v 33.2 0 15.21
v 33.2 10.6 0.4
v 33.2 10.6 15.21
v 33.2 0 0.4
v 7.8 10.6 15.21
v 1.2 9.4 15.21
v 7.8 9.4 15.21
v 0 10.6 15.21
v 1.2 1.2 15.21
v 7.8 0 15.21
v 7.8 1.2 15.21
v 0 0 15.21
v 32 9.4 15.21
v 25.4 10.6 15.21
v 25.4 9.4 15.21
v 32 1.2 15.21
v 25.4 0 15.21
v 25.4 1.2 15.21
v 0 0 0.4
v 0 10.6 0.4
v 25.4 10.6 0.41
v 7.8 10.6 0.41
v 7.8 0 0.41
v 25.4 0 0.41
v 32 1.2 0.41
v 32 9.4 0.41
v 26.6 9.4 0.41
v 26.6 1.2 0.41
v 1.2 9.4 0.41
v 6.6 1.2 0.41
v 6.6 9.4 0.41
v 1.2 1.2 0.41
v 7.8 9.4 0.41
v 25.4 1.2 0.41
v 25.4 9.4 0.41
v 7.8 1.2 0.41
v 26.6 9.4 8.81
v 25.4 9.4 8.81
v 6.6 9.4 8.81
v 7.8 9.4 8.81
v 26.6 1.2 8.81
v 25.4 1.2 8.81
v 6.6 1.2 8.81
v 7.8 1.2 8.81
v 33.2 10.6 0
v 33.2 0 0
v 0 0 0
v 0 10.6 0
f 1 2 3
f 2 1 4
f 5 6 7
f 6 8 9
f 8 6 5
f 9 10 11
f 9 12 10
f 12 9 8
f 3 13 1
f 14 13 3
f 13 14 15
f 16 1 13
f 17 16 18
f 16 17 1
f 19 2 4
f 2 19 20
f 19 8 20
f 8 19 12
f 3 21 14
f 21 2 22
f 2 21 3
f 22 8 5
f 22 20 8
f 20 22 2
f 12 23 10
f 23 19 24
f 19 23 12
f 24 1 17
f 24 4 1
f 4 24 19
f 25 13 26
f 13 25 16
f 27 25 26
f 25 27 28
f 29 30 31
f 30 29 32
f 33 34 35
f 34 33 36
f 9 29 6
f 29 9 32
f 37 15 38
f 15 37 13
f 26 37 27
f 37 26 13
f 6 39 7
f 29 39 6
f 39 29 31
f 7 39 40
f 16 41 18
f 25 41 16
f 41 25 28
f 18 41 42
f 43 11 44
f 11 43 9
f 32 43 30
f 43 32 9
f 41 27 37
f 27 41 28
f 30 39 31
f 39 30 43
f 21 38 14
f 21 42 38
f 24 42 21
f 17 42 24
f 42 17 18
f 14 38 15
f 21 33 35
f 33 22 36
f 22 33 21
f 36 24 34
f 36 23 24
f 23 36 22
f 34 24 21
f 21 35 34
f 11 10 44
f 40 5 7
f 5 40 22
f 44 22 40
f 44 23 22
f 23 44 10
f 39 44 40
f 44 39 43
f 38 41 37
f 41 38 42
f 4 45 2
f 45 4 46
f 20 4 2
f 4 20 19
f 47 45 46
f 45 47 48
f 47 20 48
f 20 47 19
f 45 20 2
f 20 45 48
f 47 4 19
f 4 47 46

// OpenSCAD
// file: ../../Base/Boxes.scad
// Fischertechnik Box Foundation
// Pre-designed Boxes

use <Constants.scad>

include <PlacementOptions.scad>

box190Width = 190;
box190Depth = 130;
box130Width = 130;
box130Depth = 95;
boxUsageHeight = 33.9;
boxWallThickness = 2.4;
boxBaseThickness = 1.0;
boxWebWidth = 3.0;

// getBoxWallThickness()
// Gets the wall thickness of a Fischertechnik Box

function getBoxWallThickness() = boxWallThickness;

// Gets the usable height of a fischertechnik box
function getBoxUsageHeight() = boxUsageHeight;

// Gets the thickness of the Fischertechnik box base.
function getBoxBaseThickness() = boxBaseThickness;

// Gets the width of a box web
function getBoxWebWidth() = boxWebWidth;

// Gets the usable inner space of a Box 190 as an x/y-list
function getBox190Space() = [
    box190Width - 2*getBoxWallThickness(), 
    box190Depth - 2*getBoxWallThickness() ];

// Imports the Fischertechnik empty box 130x190 mm and places it at position 0,0
// 190x130 are the outer sizes, the inner space is slightly smaller. Use getBox190Space() to get the inner sizes.
// This module needs the STL file "Fischertechnik Box 130x190.stl" in the library path.
// The box is positioned that the usable inner space is at the 0,0,0 position. The

module Box190() {
    translate([-getBoxWallThickness(),-getBoxWallThickness(),-getBoxBaseThickness()])
        import("Fischertechnik Box 130x190.stl", convexity=3);
}

// Gets the usable inner space of a Box 130 as an x/y-list
function getBox130Space() = [
    box130Width - 2*getBoxWallThickness(), 
    box130Depth - 2*getBoxWallThickness() ];

// Imports the Fischertechnik empty box 95x130 mm and places it at position 0,0
// 190x130 are the outer sizes, the inner space is slightly smaller. Use getBox190Space() to get the inner sizes.
// This module needs the STL file "Fischertechnik Box 95x130.stl" in the library path.
// The box is positioned that the usable inner space is at the 0,0,0 position. The

module Box130() {
    translate([-getBoxWallThickness(),-getBoxWallThickness(),-getBoxBaseThickness()])
        import("Fischertechnik Box 95x130.stl", convexity=3);
}

// Creates a web at the specified box walls
// corner 0 = LowerLeft, 1 = UpperLeft, 2 = UpperRight, 3 = LowerRight
// side 0 = LeftOfCorner, 1 = RightOfCorner
// distance = Distance in mm from the corner
// box = inner width and depth of the box (default: Box 190)
// webWidth = length of the web (default is 3 mms)
// webThickness = thickness of the web (default is 1 mm)

module BoxWeb(corner, side, distance, box=getBox190Space(), webWidth=getBoxWebWidth(), webThickness=1.0) {
    sink = getBoxWallThickness()/2;

    width = (corner % 2 == 0) ? 
            (side == LeftOfCorner ? webWidth : webThickness) :
            (side == LeftOfCorner ? webThickness : webWidth);

    depth = (corner % 2 == 0) ? 
            (side == RightOfCorner ? webWidth : webThickness) :
            (side == RightOfCorner ? webThickness : webWidth);
    
    xDiff = corner == LowerLeft ? 
                (side == LeftOfCorner ? -sink : distance) :
            (corner == UpperLeft ?                
                (side == LeftOfCorner ? distance : -sink) :
            (corner == UpperRight ?
                (side == LeftOfCorner ? box.x-webWidth+sink : box.x-distance-webThickness) :
                (side == LeftOfCorner ? box.x-distance-webThickness: box.x-webWidth+sink)));

    yDiff = corner == LowerLeft ? 
                (side == RightOfCorner ? -sink : distance) :
            (corner == UpperLeft ?
                (side == RightOfCorner ? box.y-distance : box.y-webWidth+sink) :
            (corner == UpperRight ?
                (side == RightOfCorner ? box.y-webWidth+sink : box.y-distance) :
                (side == RightOfCorner ? distance : -sink)));
    
    translate([xDiff, yDiff, -getExcess()])
        cube([width, depth, boxUsageHeight + 2*getExcess()]);
}
// file: ../../Base/Rotation.scad
// Fischertechnik Box Foundation
// Geometry Helpers Rotation

include <PlacementOptions.scad>

// getRotatedSpace(space, rotation=NoRotation)
// Rotates the space dependent on the specified rotation

function getRotatedSpace(space, rotation=NoRotation) = [
    (rotation == Rotate90 || rotation == Rotate270) ? space.y : space.x,
    (rotation == Rotate90 || rotation == Rotate270) ? space.x : space.y
];

// Rotates the given space around the fixed left lower corner
// space = the space the children needs as width/depth list [width,depth]
// rotation = 0 Rotate0 degrees, 1 Rotate90 degrees, 2 Rotate180 degrees, 3 Rotate270 degrees (equivalent to -90)

module RotateFix(space, rotation=Rotate0) {
    dy = (rotation == Rotate0 || rotation == Rotate270) ? 0 :
        (rotation == Rotate90) ? space.x :
        space.y;
    dx = (rotation < Rotate180) ? 0 :
        (rotation == Rotate180) ? space.x :
        space.y;
    
    translate([dx, dy, 0])
        rotate([0, 0, rotations[rotation]])
            children();
}
// file: ../../Base/Alignment.scad
// Fischertechnik Box Foundation
// Geometry Helpers Alignment

include <PlacementOptions.scad>

// getAlignedX(elementWidth, spaceWidth, align=AlignRight, offset=0)
// Gets the aligned X offset of an element with the given
// width in the given space.
// elementWidth = The width of the element to positon
// spaceWidth = The space where the element should be aligned
// align = 0 AlignLeft, 1 AlignCenter, 2 AlignRight
// offset = an optional offset from the aligned position. When
// aligned left or centered, then positive values are in X direction.
// When aligned right then positive values are in negative X direction.

function getAlignedX(elementWidth, spaceWidth, align=AlignRight, offset=0) =
    (align == AlignLeft) ?
        offset :
        ((align == AlignCenter) ?
        (spaceWidth - elementWidth)/2 + offset :
        spaceWidth - offset - elementWidth);

// getAlignedY(elementDepth, spaceDepth, align=AlignTop, offset=0)
// Gets the aligned Y offset of an element with the given
// depth in the given space.
// elementDepth = The depth of the element to positon
// spaceDepth = The space where the element should be aligned
// align = 0 AlignBottom, 1 AlignCenter, 2 AlignTop
// offset = an optional offset from the aligned position. When
// aligned bottom or centered, then positive values are in Y direction.
// When aligned top then positive values are in negative Y direction.

function getAlignedY(elementDepth, spaceDepth, align=AlignTop, offset=0) =
    (align == AlignBottom) ?
        offset :
        ((align == AlignCenter) ?
        (spaceDepth - elementDepth)/2 + offset :
        spaceDepth - offset - elementDepth);
// file: ../../Base/PlacementOptions.scad
// Fischertechnik Box Foundation
// Placement Options

// Alignment
NoAlign = 0;
AlignLeft = 1;
AlignBottom = 2;
AlignCenter = 3;
AlignRight = 4;
AlignTop = 5;

// Element rotation degree steps
rotations = [0, -90, -180, -270];

// Rotation
NoRotation = 0;
Rotate0 = 0;
Rotate90 = 1;
Rotate180 = 2;
Rotate270 = 3;

// Docking (seen from above)
NoDock = -1;
DockLeft = 0;
DockTop = 1;
DockRight = 2;
DockCorner = 2;
DockBottom = 3;

// Web corners
LowerLeft = 0;
UpperLeft = 1;
UpperRight = 2;
LowerRight = 3;

// Web position relative to corner
LeftOfCorner = 0;
RightOfCorner = 1;
// file: ../../Base/Placement.scad
// Fischertechnik Box Foundation
// Geometry Helpers Placement

use <Constants.scad>
use <Alignment.scad>
use <Rotation.scad>
use <Boxes.scad>

include <PlacementOptions.scad>

// Place(x=0, y=0, elementSpace=[0,0], alignX=AlignLeft, alignY=AlignBottom, rotation=Rotate0, boxSpace=getBox190Space())
// Places the child at the specified position
// y = Y-Position. This is a relative position when an X aligment is specified.
// x = X-Position. This is a relative position when an Y aligment is specified.
// elementSpace = space of the element to be placed [x,y]
// alignX = -1=NoAlign, 0 AlignLeft, 1 AlignCenter, 3 AlignRight (elementSpace and boxSpace required!)
// alignY = -1=NoAlign, 2 AlignBottom, 1 AlignCenter, 4 AlignTop (elementSpace and boxSpace required!)
// rotation = 0 Rotate0 0 degrees, 1 Rotate90 90 degrees, 
// 2 Rotate180 180 degrees, 3 Rotate270 270 degrees (equivalent to -90)
// boxSpace = Inner space of the box where the placement occurs [x,y] - default is Box 190x130 inner space

module Place(x=0, y=0, elementSpace=[0,0], 
  alignX=AlignLeft, alignY=AlignBottom, 
  rotation=NoRotation, boxSpace=getBox190Space()) {

    module Position(x, y, space, rotation=Rotate0) {
        translate([x, y, 0])
            RotateFix(space, rotation)
                children();
    }

    space = getRotatedSpace(elementSpace, rotation);
    alignedX = getAlignedX(space.x, boxSpace.x, alignX, x);
    alignedY = getAlignedY(space.y, boxSpace.y, alignY, y);
    Position(alignedX, alignedY, elementSpace, rotation)
        children();
}

// Center(space=getBox130Space(), elementSpace=[0,0])
// space = Space where the children is centered. For cylinder use centered=true and no elementSpace.
// elementSpace = space of the element to be centered [x,y]

module Center(space=getBox190Space(), elementSpace=[0,0]) {
    translate([(space.x - elementSpace.x) / 2, (space.y - elementSpace.y) / 2])
        children(0);
}

// CenterHorizontal(width=0, y=0, offset=0, space=getBox130Space())
// space = Space where the children is centered. For cylinder use centered=true and no elementSpace.
// elementSpace = space of the element to be centered [x,y]

module CenterHorizontal(width=0, y=0, offset=0, space=getBox190Space()) {
    translate([(space.x - width) / 2 + offset, y])
        children(0);
}

// CenterVertical(depth=0, x=0, offset=0, space=getBox130Space())
// space = Space where the children is centered. For cylinder use centered=true and no elementSpace.
// elementSpace = space of the element to be centered [x,y]

module CenterVertical(depth=0, x=0, offset=0, space=getBox190Space()) {
    translate([x, (space.y - depth) / 2 + offset])
        children(0);
}
// file: ../../Elements/AxisClip10.scad
// Fischertechnik Box Library
// Axis for clip 10
// 31023

use <../ModelBase/Simple.scad>

width = 12;
depth = 12;
height = 23;

// getAxisClip10Space()
// Gets the space of a frame for a clip 10 with spring ring (mot2)

function getAxisClip10Space() = [width, depth, height];

// AxisClip10()
// Axis for clip 10 with spring ring (mot2)

module AxisClip10() {
    LeveledAxisWithSpace(height, height-10, getAxisClip10Space());
}

// Tests
color("lightgray")
AxisClip10();
// file: ../../Base/Constants.scad
// Fischertechnik Box Foundation
// Constants

// Constant values necessary for multiple elements

// Base constants
dividerThickness = 1.2;
excess = 0.01;
fragments = 90;
tolerance = 0.8;

// Gets the thickness of a divider 
function getDividerThickness() = dividerThickness;

// Gets the excess that is used to merge walls into each other
function getExcess() = excess;

// Gets amount of fragments of a cylinder
function getFragments() = fragments;

// Gets the inner tolerance of a frame to each side
function getTolerance() = tolerance;


// Fischertechnik specific constants
axisDiameter = 4;
axisBottomDiameter = axisDiameter + 1;
standardEdgeDistance = 2.5;
standardWebDistance = 11.5;
standardCornerLength = 15;
tubeWallFactor = 0.8;

// Gets axis diameter
function getAxisDiameter() = axisDiameter;

// Gets axis bottom diameter for thicker part at the bottom
function getAxisBottomDiameter() = axisBottomDiameter;

// gets the standard distance to the wall of the box for dockable frames with webs
function getStandardEdgeDistance() = standardEdgeDistance;

// gets the standard distance of each web to the corner of the dockable frame
function getStandardWebDistance() = standardWebDistance;

// gets the standard length of the corner walls of a dockable frame
function getStandardCornerLength() = standardCornerLength;

// gets the wall thickness of a tube.
function getTubeWallThickness() = tubeWallFactor * getDividerThickness();
// file: ../../Elements/FrameTwoConnectors30.scad
// Fischertechnik Box Library
// Frame for two Connectors 30
// 31061

use <../ModelBase/Complex.scad>

width = 30;
depth = 8.2;
height = 14.8;

// getFrameTwoConnectors30Space()
// Gets the space needed for the frame for two struts.
function getFrameTwoConnectors30Space() = getElevatedFramesWithCutoffSpace([width, depth, height]);

// FrameTwoConnectors30()
// Frame for two connectors 30

module FrameTwoConnectors30() {    
    bearingLength = 6.6;
    loadHeight = 6.4;
    
    ElevatedFramesWithCutoff([width, depth, loadHeight], depth, height, bearingLength);
}

// Test
color("lightgray")
FrameTwoConnectors30();
// file: ../TestPrint.scad
// 3D Print Test Base

use <../Base/Constants.scad>

use <../Elements/AxisClip10.scad>

module TestPrint(elementSpace) {
    cube([elementSpace.x, elementSpace.y, 0.4]);
    translate([0,0,0.4+getExcess()]) {
        children();
    }
}

TestPrint(getAxisClip10Space())
    AxisClip10();
// main file
// 3D Print Test Base
// FrameTwoConnectors30

use <../TestPrint.scad>
use <../../Elements/FrameTwoConnectors30.scad>

TestPrint(getFrameTwoConnectors30Space())
    FrameTwoConnectors30();
